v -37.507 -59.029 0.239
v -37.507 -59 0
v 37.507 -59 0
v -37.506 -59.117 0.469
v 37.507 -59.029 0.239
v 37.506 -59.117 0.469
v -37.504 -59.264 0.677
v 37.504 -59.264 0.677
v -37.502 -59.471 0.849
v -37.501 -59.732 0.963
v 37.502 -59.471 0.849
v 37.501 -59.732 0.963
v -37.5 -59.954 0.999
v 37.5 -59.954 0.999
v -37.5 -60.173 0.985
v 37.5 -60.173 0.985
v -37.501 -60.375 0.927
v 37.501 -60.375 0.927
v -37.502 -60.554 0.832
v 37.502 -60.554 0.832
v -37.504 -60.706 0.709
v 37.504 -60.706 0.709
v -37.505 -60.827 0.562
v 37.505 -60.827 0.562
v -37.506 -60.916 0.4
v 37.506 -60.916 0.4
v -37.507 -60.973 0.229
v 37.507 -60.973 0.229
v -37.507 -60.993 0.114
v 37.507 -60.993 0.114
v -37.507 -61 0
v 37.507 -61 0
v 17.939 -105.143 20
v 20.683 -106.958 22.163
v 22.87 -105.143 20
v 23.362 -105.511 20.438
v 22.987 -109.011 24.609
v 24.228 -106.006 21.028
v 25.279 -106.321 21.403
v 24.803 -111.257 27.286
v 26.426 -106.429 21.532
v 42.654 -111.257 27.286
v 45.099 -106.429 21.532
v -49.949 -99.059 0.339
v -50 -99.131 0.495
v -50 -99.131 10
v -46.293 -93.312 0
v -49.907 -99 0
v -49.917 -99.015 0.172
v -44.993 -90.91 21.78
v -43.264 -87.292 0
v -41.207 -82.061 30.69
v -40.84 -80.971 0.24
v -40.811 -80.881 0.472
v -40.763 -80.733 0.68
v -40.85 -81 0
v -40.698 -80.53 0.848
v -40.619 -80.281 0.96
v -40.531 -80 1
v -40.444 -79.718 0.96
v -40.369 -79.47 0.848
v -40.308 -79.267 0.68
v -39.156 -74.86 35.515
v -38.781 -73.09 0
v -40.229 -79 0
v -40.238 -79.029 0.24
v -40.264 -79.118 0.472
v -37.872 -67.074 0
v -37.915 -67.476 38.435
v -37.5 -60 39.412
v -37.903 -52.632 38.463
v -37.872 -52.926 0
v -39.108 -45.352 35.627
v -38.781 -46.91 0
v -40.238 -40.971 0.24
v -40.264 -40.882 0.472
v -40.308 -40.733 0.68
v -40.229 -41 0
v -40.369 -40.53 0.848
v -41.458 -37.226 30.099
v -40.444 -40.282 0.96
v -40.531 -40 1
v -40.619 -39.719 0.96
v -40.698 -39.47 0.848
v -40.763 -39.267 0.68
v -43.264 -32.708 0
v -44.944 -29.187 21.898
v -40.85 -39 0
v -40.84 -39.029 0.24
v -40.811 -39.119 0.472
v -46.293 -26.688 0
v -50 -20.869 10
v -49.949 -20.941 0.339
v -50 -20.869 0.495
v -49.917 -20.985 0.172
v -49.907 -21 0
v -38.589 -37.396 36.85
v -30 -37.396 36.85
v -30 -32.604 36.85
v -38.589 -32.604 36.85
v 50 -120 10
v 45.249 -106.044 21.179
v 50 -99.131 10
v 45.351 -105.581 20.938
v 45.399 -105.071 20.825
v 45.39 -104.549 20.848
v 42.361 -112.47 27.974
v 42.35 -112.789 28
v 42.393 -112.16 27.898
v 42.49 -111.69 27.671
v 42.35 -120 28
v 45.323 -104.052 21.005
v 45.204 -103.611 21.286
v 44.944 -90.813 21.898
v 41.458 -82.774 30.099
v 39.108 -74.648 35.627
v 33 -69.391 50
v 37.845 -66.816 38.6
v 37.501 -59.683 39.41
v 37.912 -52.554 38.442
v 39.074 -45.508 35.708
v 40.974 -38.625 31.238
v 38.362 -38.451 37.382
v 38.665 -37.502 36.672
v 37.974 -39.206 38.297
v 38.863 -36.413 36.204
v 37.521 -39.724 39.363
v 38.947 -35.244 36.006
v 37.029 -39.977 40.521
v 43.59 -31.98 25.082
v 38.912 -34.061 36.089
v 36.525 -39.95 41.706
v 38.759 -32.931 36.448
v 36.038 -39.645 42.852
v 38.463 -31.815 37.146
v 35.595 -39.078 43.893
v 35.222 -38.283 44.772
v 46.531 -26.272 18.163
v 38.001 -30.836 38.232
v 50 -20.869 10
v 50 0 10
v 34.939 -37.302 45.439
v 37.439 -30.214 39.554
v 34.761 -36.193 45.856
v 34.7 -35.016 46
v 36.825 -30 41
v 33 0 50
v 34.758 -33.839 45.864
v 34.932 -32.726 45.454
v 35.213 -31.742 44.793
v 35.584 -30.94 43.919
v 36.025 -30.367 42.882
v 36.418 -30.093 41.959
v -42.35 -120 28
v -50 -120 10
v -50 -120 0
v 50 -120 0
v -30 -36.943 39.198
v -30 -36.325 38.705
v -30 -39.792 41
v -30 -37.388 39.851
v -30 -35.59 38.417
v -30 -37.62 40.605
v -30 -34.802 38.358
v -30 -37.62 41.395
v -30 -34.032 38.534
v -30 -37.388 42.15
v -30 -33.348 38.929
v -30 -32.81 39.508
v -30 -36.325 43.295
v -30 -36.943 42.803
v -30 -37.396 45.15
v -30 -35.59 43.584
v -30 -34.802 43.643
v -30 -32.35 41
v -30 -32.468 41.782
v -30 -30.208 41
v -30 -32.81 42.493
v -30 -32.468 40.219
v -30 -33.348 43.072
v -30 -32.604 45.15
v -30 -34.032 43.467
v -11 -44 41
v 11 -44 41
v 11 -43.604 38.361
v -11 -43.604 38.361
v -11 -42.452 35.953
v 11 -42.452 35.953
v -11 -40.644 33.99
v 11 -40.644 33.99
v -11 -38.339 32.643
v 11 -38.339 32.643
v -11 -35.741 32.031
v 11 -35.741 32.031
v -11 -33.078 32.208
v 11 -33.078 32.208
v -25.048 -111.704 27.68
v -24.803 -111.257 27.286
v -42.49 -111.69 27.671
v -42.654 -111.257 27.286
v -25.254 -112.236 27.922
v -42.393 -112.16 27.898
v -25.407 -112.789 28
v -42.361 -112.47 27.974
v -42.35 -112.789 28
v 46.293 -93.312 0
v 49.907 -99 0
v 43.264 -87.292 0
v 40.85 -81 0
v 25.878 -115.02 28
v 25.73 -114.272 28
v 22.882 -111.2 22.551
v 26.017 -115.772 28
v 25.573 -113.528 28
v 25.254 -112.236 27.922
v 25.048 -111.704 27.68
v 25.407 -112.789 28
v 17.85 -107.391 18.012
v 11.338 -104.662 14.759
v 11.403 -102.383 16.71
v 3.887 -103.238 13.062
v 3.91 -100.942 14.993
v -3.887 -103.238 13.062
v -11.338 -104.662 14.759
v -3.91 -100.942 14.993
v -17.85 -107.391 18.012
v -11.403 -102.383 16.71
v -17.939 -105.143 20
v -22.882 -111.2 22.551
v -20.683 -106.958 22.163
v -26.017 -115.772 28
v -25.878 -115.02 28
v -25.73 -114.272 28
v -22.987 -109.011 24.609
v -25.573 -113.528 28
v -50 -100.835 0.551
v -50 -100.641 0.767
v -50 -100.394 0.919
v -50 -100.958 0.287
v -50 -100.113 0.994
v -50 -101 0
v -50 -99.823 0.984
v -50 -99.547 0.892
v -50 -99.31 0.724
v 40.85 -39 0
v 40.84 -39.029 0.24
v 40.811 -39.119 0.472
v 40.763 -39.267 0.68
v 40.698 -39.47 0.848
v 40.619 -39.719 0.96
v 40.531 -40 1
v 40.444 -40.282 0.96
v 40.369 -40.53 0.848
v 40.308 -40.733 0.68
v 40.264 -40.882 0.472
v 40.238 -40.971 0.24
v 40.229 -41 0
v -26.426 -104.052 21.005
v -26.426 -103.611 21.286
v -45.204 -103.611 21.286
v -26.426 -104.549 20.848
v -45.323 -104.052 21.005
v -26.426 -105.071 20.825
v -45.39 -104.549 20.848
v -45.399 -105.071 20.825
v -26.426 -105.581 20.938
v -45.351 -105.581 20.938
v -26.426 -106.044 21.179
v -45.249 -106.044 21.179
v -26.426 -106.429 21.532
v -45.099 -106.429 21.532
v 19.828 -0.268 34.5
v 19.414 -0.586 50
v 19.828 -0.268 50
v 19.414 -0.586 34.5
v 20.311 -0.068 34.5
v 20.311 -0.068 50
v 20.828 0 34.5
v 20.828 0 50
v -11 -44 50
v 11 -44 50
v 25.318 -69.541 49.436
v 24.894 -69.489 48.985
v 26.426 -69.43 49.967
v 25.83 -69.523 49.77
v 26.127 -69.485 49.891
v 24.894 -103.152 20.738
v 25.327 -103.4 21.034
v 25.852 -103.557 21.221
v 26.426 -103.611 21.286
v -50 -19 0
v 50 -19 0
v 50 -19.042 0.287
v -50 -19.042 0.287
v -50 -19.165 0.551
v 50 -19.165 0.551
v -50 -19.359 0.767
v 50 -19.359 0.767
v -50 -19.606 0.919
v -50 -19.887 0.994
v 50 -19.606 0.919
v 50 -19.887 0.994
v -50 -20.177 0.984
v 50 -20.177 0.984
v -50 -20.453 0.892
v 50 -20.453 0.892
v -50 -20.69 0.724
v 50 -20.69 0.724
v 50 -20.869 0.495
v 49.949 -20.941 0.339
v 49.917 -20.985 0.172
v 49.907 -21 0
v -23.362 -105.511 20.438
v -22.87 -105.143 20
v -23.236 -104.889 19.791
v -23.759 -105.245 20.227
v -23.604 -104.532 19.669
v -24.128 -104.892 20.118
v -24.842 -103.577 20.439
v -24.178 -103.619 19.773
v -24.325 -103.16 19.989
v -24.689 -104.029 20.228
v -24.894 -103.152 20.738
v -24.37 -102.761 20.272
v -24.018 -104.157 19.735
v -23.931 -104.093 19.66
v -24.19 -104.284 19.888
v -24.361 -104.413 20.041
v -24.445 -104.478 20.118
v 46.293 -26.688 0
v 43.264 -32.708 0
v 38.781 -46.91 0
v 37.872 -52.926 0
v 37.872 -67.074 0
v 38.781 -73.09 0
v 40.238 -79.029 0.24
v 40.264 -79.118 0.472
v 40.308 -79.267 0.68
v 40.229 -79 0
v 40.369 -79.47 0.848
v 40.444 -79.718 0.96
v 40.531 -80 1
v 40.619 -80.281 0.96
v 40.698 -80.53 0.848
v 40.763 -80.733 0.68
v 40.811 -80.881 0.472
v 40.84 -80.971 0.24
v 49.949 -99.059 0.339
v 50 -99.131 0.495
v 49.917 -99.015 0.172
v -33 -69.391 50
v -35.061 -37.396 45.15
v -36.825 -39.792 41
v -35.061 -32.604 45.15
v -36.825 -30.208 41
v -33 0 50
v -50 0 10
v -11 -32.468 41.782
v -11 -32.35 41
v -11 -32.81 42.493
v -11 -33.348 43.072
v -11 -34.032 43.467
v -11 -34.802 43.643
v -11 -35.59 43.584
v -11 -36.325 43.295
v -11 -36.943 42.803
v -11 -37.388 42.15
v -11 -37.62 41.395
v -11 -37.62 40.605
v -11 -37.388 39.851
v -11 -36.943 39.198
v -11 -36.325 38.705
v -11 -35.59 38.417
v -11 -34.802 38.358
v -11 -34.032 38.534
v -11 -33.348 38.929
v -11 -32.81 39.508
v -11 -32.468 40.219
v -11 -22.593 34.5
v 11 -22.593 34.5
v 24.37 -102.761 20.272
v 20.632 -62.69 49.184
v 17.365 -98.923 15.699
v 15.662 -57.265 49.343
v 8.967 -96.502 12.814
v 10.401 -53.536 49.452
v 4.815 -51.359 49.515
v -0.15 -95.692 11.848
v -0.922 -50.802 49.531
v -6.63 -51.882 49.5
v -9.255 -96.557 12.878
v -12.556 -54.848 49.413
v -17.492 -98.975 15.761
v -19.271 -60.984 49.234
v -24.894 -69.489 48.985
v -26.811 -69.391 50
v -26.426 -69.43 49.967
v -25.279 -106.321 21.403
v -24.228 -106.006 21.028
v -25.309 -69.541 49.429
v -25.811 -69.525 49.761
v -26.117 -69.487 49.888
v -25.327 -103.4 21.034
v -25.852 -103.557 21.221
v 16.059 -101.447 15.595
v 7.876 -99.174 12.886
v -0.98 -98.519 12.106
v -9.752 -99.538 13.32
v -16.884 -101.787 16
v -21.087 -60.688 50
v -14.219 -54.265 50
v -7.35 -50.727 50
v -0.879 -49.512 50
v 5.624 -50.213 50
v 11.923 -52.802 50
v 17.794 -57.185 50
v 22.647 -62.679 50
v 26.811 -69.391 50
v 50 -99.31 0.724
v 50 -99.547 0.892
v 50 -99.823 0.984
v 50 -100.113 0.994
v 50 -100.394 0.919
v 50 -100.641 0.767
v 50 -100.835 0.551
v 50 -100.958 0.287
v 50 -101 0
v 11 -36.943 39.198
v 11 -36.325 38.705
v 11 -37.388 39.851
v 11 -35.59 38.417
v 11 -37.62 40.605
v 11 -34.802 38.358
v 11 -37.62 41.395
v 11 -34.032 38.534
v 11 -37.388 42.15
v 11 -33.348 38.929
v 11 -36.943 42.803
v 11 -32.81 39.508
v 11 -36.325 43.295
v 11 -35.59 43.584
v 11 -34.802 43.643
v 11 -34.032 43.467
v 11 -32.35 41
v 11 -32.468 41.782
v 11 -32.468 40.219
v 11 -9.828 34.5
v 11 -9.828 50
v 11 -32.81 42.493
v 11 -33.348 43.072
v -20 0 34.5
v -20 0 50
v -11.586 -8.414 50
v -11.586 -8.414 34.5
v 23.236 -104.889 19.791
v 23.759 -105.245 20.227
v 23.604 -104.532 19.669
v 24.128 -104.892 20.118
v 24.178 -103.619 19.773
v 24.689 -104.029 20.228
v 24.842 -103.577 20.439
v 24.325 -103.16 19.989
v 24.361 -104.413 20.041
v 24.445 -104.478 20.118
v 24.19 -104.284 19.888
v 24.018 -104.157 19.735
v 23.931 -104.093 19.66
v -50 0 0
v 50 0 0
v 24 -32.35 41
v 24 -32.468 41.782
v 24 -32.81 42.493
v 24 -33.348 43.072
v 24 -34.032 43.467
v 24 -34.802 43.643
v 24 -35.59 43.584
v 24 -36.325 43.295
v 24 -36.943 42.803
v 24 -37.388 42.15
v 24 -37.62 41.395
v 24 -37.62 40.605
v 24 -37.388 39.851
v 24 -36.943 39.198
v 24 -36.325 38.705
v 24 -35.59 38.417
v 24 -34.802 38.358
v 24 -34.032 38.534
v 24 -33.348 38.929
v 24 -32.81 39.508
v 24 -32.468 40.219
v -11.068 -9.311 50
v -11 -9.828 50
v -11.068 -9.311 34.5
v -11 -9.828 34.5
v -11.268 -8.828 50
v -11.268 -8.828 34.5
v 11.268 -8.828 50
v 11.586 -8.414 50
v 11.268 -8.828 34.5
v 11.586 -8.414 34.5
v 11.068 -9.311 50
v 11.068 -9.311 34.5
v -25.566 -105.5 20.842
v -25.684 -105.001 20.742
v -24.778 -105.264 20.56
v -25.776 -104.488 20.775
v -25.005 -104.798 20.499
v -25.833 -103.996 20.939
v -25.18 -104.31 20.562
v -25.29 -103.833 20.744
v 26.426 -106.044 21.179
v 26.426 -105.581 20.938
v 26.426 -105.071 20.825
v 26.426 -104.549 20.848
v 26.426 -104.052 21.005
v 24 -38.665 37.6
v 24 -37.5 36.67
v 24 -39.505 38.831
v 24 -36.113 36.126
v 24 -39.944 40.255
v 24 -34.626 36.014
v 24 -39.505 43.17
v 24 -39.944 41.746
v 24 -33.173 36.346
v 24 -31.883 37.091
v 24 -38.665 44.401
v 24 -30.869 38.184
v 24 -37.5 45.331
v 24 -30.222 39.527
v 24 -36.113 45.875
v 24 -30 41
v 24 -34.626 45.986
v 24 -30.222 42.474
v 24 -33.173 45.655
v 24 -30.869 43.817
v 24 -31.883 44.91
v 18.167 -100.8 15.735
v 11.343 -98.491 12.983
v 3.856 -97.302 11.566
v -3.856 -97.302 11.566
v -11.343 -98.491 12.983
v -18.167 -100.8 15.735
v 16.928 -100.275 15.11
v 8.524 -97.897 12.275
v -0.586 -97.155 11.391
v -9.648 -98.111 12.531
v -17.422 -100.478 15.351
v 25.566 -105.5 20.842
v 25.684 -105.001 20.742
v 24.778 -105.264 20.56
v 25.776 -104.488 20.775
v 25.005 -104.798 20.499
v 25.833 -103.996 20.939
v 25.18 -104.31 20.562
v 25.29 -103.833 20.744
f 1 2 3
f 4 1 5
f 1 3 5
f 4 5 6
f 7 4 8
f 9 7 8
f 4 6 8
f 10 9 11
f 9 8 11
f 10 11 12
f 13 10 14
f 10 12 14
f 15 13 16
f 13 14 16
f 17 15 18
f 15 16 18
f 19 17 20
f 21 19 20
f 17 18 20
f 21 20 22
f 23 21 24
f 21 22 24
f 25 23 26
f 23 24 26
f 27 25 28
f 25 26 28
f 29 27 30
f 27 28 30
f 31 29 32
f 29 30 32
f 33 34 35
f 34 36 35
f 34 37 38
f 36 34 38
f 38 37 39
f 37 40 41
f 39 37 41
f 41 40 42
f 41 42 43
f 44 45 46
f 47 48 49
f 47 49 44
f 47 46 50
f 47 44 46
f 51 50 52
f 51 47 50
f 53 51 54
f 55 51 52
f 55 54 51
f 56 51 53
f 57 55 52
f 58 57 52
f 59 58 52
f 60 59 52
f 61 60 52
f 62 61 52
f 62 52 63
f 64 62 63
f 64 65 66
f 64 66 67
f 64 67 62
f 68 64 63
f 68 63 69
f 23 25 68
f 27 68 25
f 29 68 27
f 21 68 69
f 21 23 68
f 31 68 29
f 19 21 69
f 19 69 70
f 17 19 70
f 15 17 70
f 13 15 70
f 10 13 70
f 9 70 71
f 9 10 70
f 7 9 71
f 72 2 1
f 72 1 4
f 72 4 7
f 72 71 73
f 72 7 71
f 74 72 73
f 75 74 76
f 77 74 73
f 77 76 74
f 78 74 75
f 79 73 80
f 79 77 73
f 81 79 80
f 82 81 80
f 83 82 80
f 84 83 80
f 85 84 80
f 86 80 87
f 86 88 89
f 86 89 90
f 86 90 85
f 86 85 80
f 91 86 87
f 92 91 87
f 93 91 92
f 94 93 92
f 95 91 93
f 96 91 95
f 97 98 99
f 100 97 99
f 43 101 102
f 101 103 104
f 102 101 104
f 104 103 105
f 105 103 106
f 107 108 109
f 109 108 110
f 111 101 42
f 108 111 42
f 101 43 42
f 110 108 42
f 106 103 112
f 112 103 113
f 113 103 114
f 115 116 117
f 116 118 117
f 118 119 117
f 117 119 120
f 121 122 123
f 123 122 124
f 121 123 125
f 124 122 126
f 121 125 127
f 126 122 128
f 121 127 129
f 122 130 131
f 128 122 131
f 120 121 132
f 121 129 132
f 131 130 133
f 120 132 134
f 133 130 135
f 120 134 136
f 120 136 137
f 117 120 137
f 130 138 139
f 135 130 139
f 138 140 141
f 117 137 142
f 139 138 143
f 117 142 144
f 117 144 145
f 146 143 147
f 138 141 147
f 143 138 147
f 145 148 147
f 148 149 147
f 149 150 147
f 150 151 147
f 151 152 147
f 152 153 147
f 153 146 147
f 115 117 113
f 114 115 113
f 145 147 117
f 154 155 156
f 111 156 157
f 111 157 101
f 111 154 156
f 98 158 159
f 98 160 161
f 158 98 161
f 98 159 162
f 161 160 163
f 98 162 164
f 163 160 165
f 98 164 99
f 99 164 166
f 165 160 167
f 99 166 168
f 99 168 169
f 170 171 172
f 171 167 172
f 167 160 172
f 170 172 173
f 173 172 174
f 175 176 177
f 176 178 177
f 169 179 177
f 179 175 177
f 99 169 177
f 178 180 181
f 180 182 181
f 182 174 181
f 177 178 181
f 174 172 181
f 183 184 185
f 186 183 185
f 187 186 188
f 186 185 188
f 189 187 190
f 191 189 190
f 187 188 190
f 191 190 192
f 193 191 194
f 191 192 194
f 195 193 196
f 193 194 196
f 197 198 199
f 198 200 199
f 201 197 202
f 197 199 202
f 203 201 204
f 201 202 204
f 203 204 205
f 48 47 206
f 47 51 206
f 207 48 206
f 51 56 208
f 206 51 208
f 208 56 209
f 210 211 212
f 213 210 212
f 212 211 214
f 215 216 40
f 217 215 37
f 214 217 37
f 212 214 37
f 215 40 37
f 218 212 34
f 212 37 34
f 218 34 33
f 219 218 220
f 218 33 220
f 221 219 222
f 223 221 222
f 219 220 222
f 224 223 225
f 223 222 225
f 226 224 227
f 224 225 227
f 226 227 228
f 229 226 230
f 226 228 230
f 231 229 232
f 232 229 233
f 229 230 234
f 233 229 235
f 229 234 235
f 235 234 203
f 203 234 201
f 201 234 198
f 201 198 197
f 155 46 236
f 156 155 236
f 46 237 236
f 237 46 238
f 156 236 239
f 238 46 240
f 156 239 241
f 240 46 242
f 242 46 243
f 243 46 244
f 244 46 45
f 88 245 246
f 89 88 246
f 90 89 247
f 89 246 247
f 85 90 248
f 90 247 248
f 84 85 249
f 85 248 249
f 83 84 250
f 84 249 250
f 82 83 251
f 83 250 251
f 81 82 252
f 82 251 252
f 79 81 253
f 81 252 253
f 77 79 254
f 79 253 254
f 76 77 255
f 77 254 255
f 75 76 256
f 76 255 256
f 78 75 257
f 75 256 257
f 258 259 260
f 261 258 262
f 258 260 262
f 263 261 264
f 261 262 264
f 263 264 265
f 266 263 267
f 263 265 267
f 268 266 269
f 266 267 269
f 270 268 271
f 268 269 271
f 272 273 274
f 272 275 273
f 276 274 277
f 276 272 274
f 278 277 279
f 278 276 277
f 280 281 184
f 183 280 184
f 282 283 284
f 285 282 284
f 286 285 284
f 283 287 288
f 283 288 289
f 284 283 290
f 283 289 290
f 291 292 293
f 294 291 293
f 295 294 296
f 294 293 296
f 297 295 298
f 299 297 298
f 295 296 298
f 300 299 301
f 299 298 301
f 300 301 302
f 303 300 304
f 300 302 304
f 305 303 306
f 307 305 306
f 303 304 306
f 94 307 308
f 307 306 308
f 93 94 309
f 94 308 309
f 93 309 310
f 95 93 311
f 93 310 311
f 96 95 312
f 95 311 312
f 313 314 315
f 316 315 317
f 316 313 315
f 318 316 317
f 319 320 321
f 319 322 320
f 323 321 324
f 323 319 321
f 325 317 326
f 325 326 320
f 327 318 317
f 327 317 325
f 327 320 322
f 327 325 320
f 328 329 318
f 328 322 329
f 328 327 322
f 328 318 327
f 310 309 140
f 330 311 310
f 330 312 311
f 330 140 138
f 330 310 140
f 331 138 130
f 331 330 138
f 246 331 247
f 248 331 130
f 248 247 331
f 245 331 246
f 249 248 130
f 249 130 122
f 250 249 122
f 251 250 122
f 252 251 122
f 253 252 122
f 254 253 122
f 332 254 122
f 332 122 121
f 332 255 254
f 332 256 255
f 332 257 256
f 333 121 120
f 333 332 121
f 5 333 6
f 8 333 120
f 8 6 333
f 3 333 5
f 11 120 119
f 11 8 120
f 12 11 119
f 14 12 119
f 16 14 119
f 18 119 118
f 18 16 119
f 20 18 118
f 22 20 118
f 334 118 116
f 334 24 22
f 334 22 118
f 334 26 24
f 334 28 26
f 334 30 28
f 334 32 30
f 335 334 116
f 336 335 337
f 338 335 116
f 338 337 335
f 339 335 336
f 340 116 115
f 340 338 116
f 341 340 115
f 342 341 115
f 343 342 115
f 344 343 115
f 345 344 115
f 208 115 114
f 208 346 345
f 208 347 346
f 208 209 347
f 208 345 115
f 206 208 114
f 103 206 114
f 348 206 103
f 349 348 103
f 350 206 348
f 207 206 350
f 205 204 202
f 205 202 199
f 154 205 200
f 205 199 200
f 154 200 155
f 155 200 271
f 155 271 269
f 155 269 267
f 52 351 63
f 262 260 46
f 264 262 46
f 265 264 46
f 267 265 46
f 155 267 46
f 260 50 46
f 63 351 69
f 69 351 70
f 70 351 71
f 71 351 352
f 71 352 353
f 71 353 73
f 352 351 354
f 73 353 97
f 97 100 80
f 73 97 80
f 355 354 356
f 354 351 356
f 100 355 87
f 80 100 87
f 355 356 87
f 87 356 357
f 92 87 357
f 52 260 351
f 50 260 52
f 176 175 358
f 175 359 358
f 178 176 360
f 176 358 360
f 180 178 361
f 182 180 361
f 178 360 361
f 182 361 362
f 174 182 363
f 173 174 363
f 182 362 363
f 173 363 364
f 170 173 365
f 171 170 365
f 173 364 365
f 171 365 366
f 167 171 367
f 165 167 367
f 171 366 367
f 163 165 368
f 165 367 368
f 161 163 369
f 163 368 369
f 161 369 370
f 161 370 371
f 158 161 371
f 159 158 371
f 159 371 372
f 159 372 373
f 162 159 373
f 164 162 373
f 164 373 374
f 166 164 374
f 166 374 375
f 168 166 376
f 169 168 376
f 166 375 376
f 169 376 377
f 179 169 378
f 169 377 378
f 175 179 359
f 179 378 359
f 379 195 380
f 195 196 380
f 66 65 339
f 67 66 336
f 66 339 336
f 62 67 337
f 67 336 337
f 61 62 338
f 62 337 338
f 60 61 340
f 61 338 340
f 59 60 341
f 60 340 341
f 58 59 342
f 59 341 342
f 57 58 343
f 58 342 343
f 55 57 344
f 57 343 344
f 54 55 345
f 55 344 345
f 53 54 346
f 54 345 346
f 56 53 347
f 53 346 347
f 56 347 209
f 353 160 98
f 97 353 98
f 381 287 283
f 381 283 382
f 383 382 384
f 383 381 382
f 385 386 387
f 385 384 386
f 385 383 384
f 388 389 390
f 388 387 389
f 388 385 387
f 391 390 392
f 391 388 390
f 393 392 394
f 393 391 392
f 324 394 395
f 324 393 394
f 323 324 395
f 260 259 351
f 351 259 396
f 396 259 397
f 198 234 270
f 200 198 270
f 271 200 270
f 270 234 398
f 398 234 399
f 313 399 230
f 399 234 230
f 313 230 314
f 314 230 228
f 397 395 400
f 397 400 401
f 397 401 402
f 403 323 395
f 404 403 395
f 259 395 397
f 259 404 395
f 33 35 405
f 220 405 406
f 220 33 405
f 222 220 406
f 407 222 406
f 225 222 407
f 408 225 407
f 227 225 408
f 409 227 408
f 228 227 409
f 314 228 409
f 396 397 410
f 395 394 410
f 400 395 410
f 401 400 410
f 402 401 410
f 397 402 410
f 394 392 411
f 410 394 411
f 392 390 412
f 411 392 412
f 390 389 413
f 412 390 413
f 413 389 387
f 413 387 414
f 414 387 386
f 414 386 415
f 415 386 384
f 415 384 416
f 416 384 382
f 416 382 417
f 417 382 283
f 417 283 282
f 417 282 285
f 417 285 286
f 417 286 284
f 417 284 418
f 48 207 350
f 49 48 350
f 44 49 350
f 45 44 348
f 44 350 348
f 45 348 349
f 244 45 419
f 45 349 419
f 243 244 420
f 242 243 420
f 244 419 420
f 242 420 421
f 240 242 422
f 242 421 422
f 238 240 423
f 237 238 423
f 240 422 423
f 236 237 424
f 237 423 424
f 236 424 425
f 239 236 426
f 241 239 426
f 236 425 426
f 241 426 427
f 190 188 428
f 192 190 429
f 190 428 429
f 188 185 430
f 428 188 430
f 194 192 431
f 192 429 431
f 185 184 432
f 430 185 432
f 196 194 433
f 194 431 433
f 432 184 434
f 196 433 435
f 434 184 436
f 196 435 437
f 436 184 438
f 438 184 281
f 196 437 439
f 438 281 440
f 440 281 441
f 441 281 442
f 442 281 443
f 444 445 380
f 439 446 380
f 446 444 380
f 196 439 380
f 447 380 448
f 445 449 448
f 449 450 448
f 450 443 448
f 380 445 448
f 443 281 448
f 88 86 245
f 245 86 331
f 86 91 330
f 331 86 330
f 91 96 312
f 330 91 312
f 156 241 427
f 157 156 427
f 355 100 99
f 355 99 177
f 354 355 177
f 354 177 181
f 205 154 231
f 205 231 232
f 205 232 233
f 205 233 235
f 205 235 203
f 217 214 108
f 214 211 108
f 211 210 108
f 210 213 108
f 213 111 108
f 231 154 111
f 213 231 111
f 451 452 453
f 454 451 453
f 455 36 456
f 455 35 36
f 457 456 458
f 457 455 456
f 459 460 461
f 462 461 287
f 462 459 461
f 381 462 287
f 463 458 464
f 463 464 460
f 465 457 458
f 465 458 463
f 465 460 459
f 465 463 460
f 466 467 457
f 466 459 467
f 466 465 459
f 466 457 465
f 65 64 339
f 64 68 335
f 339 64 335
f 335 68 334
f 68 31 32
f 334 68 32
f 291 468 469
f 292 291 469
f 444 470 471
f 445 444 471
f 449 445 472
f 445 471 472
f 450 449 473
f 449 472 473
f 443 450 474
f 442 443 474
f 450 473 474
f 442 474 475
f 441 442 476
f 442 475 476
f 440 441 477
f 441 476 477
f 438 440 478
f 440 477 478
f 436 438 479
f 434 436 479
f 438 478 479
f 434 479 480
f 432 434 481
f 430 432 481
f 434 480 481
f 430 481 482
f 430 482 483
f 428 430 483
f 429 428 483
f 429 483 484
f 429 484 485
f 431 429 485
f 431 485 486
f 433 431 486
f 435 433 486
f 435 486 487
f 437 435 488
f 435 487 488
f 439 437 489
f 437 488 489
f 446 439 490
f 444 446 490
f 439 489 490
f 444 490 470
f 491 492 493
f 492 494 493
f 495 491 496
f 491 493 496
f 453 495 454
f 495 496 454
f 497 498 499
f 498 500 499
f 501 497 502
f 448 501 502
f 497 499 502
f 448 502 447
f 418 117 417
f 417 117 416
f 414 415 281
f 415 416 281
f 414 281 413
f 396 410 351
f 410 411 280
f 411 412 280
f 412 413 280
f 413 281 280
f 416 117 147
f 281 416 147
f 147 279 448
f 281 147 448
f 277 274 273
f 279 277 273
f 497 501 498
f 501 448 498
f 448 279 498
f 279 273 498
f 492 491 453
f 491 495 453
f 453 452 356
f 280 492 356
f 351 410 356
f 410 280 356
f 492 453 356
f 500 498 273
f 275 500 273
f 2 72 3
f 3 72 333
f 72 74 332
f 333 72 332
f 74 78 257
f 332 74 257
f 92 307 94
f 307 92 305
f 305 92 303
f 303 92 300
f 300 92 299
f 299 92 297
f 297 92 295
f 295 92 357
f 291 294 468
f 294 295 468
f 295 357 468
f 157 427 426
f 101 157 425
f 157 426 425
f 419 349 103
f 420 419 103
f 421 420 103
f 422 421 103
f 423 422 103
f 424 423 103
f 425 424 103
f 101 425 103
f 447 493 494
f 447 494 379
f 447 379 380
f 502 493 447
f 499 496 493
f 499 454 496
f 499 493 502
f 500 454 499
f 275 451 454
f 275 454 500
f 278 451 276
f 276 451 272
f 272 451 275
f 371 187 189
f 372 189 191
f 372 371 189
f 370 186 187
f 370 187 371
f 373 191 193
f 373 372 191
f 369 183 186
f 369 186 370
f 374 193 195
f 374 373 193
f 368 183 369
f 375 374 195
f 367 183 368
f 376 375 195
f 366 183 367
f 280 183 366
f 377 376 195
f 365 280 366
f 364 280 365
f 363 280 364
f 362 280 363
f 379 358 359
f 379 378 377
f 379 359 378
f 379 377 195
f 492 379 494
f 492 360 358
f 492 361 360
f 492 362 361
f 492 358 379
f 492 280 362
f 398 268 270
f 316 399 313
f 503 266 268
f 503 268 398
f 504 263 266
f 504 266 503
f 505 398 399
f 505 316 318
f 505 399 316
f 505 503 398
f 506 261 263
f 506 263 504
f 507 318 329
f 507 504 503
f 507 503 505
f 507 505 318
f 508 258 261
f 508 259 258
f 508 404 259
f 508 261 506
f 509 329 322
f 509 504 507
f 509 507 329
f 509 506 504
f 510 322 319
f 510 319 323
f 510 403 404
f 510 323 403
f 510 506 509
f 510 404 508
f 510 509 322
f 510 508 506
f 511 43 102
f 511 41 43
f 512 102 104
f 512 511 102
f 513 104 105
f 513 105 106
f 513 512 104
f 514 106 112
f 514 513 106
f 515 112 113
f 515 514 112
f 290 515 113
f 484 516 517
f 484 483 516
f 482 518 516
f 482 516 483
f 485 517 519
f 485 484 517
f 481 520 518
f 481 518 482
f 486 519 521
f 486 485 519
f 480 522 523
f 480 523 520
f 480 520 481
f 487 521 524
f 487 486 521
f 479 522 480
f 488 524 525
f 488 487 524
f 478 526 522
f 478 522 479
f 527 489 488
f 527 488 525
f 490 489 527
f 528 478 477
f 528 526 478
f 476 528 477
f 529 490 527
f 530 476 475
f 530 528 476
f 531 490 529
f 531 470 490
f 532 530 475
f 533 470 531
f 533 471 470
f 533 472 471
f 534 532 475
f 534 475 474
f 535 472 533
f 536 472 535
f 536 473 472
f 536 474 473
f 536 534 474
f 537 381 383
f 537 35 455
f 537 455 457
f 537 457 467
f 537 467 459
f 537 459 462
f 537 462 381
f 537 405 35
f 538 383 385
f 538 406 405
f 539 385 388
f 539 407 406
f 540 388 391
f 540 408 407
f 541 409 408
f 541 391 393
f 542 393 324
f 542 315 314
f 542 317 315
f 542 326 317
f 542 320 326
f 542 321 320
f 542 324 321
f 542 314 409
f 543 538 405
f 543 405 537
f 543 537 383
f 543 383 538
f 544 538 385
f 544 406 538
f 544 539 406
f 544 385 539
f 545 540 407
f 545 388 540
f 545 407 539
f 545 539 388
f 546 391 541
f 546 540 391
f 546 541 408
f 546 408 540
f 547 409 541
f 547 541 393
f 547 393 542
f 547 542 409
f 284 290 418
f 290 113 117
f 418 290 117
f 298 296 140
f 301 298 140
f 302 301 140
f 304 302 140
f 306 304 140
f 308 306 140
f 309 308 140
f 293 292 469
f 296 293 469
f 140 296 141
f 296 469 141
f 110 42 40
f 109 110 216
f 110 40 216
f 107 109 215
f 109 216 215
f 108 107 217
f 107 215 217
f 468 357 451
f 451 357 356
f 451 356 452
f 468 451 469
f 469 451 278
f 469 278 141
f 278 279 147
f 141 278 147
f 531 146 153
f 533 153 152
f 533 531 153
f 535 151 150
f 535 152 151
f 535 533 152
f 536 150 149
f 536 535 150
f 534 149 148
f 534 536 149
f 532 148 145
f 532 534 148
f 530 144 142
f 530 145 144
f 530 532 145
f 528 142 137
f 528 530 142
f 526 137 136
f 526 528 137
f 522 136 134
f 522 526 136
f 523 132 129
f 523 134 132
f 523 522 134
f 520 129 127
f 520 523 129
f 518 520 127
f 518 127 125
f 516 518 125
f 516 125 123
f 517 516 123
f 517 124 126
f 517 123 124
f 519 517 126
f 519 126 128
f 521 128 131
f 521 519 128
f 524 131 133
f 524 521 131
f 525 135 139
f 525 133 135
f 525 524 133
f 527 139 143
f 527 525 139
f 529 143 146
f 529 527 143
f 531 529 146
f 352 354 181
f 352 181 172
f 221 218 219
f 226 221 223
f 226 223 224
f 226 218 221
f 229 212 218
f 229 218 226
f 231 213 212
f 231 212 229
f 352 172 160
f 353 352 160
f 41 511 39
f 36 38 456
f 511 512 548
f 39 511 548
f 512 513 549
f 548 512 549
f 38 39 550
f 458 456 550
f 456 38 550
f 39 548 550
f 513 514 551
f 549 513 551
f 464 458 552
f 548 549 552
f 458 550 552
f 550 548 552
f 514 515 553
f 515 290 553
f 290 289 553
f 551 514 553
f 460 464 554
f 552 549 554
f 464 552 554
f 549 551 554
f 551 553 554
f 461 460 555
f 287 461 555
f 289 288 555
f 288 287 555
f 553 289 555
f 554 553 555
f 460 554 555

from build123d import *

# Parameters (mm, degrees)
F1_DEPTH  = 120
F2_R      = 2.65
F3_DEPTH  = 50
F4_DEPTH  = 11
F6_R      = 5
F6_R_2    = 2.65
F7_DEPTH  = 25
F10_DEPTH = 25
F11_W     = 11
F11_H     = 9
F12_DEPTH = 15.4995888315
F14_DEPTH = 100.001
F15_R     = 32.5
F16_DEPTH = 100
F17_R     = 27
F18_DEPTH = 3
F19_R     = 1
F20_DEPTH = 100.001
F21_R     = 67.5
F22_DEPTH = 50.001
F23_R     = 2


with BuildPart() as f1:
    # F0 (on Front) → F1 (new body)
    with BuildSketch(Plane.XZ):
        Polygon((-50, 0), (0, 0), (0, 50), (-33, 50), (-50, 10), align=None)
        Polygon((0, 50), (0, 0), (50, 0), (50, 10), (33, 50), align=None)
    extrude(amount=F1_DEPTH)

    # F2 (on Right) → F3 (cut, symmetric)
    with BuildSketch(Plane.YZ):
        with Locations((-35, 41.0004111685)):
            Circle(F2_R)
    extrude(amount=F3_DEPTH, both=True, mode=Mode.SUBTRACT)

    # F2 (on Right) → F4 (cut, symmetric)
    with BuildSketch(Plane.YZ):
        with BuildLine():
            Line((-22.5925706327, 34.5004111685), (0, 34.5004111685))
            Line((0, 34.5004111685), (0, 47.5004111685))
            Line((0, 47.5004111685), (-28.775050201, 47.5004111685))
            ThreePointArc((-28.775050201, 47.5004111685), (-26.7227858494, 44.5342088289), (-26, 41.0004111685))
            ThreePointArc((-26, 41.0004111685), (-26.7227858494, 37.4666135082), (-28.775050201, 34.5004111685))
            Line((-28.775050201, 34.5004111685), (-22.5925706327, 34.5004111685))
        make_face()
        with BuildLine():
            Line((-33.0777759178, 32.2080818652), (-22.5925706327, 34.5004111685))
            Line((-22.5925706327, 34.5004111685), (-28.775050201, 34.5004111685))
            ThreePointArc((-28.775050201, 34.5004111685), (-30.7682386679, 33.0573515547), (-33.0777759178, 32.2080818652))
        make_face()
        with BuildLine():
            Line((-28.775050201, 47.5004111685), (0, 47.5004111685))
            Line((0, 47.5004111685), (0, 56.6271956305))
            Line((0, 56.6271956305), (-27.1273270008, 51.5032727532))
            Line((-27.1273270008, 51.5032727532), (-35.0860282779, 50))
            ThreePointArc((-35.0860282779, 50), (-31.6858522299, 49.3679929314), (-28.775050201, 47.5004111685))
        make_face()
        with BuildLine():
            ThreePointArc((-33.0777759178, 32.2080818652), (-30.7682386679, 33.0573515547), (-28.775050201, 34.5004111685))
            ThreePointArc((-28.775050201, 34.5004111685), (-26.7227858494, 37.4666135082), (-26, 41.0004111685))
            ThreePointArc((-26, 41.0004111685), (-26.7227858494, 44.5342088289), (-28.775050201, 47.5004111685))
            ThreePointArc((-28.775050201, 47.5004111685), (-31.6858522299, 49.3679929314), (-35.0860282779, 50))
            ThreePointArc((-35.0860282779, 50), (-41.394304282, 47.3338835771), (-44, 41.0004111685))
            ThreePointArc((-44, 41.0004111685), (-40.6435796823, 33.9897044731), (-33.0777759178, 32.2080818652))
        make_face()
        with Locations((-35, 41.0004111685)):
            Circle(F2_R, mode=Mode.SUBTRACT)
        with BuildLine():
            Line((-44, 53.045399487), (-44, 41.0004111685))
            ThreePointArc((-44, 41.0004111685), (-41.394304282, 47.3338835771), (-35.0860282779, 50))
            Line((-35.0860282779, 50), (-27.1273270008, 51.5032727532))
            Line((-27.1273270008, 51.5032727532), (-44, 53.045399487))
        make_face()
    extrude(amount=F4_DEPTH, both=True, mode=Mode.SUBTRACT)

    # F6 (on offset) → F7 (cut)
    with BuildSketch(Plane.YZ.offset(24)):
        with Locations((-35, 41.0004111685)):
            Circle(F6_R)
        with Locations((-35, 41.0004111685)):
            Circle(F6_R_2, mode=Mode.SUBTRACT)
    extrude(amount=F7_DEPTH, mode=Mode.SUBTRACT)

    # F9 (on offset) → F10 (cut)
    with BuildSketch(Plane.YZ.offset(-30)):
        Polygon((-39.7920072343, 41.0004111685), (-37.3960036171, 36.8504111685), (-32.6039963829, 36.8504111685), (-30.2079927657, 41.0004111685), (-32.6039963829, 45.1504111685), (-37.3960036171, 45.1504111685), align=None)
    extrude(amount=-F10_DEPTH, mode=Mode.SUBTRACT)

    # F11 (on face) → F12 (cut, through all)
    with BuildSketch(Plane.XY.offset(50)):
        Polygon((-20, 0), (-11, -9), (-11, 0), align=None)
        Polygon((11, 0), (11, -9), (20, 0), align=None)
        with Locations((-5.5, -4.5)):
            Rectangle(F11_W, F11_H)
        with Locations((5.5, -4.5)):
            Rectangle(F11_W, F11_H)
    extrude(amount=-F12_DEPTH, mode=Mode.SUBTRACT)

    # F13 (on face) → F14 (cut, through all)
    with BuildSketch(Plane.YZ.offset(50)):
        Polygon((-105.143306435, 20), (-33.7286775579, 79.9239887514), (-151.3096454964, 75.0189004333), (-120, 37.7055179301), (-111.8561034844, 28), align=None)
        Polygon((-120, 28), (-111.8561034844, 28), (-120, 37.7055179301), align=None)
    extrude(amount=-F14_DEPTH, mode=Mode.SUBTRACT)

    # F15 (on face) → F16 (cut)
    with BuildSketch(Plane(origin=(0, -51.8525474655, -43.5094534539), x_dir=(-1, 0, 0), z_dir=(0, 0.7660444431, 0.6427876097))):
        with Locations((0, 103.0848769822)):
            Circle(F15_R)
    extrude(amount=F16_DEPTH, mode=Mode.SUBTRACT)

    # F17 (on face) → F18 (cut)
    with BuildSketch(Plane(origin=(0, -51.8525474655, -43.5094534539), x_dir=(-1, 0, 0), z_dir=(0, 0.7660444431, 0.6427876097))):
        with Locations((0, 103.0848769822)):
            Circle(F17_R)
    extrude(amount=-F18_DEPTH, mode=Mode.SUBTRACT)

    # F19 (on face) → F20 (cut, through all)
    with BuildSketch(Plane.YZ.offset(50)):
        with Locations((-20, 0)):
            Circle(F19_R)
        with Locations((-40, 0)):
            Circle(F19_R)
        with Locations((-60, 0)):
            Circle(F19_R)
        with Locations((-80, 0)):
            Circle(F19_R)
        with Locations((-100, 0)):
            Circle(F19_R)
    extrude(amount=-F20_DEPTH, mode=Mode.SUBTRACT)

    # F21 (on Top) → F22 (cut, through all)
    with BuildSketch(Plane.XY):
        with Locations((105, -60)):
            Circle(F21_R)
        with Locations((-105, -60)):
            Circle(F21_R)
    extrude(amount=F22_DEPTH, mode=Mode.SUBTRACT)

    # F23
    f23_edges = [f1.edges().sort_by_distance(p)[0] for p in [
        (20, 0, 42.250206),
        (11, -9, 42.250206),
        (-11, -9, 42.250206),
        (-25.476479, -87.267003, 35),
        (25.476479, -87.267003, 35),
        (0, -50.222895, 50),
        (-33.766783, -111.856103, 28),
        (33.766783, -111.856103, 28),
        (-35.613239, -105.143306, 20),
        (35.613239, -105.143306, 20),
        (0, -97.223632, 10.561699),
    ]]
    fillet(f23_edges, radius=F23_R)


solid = f1.part
